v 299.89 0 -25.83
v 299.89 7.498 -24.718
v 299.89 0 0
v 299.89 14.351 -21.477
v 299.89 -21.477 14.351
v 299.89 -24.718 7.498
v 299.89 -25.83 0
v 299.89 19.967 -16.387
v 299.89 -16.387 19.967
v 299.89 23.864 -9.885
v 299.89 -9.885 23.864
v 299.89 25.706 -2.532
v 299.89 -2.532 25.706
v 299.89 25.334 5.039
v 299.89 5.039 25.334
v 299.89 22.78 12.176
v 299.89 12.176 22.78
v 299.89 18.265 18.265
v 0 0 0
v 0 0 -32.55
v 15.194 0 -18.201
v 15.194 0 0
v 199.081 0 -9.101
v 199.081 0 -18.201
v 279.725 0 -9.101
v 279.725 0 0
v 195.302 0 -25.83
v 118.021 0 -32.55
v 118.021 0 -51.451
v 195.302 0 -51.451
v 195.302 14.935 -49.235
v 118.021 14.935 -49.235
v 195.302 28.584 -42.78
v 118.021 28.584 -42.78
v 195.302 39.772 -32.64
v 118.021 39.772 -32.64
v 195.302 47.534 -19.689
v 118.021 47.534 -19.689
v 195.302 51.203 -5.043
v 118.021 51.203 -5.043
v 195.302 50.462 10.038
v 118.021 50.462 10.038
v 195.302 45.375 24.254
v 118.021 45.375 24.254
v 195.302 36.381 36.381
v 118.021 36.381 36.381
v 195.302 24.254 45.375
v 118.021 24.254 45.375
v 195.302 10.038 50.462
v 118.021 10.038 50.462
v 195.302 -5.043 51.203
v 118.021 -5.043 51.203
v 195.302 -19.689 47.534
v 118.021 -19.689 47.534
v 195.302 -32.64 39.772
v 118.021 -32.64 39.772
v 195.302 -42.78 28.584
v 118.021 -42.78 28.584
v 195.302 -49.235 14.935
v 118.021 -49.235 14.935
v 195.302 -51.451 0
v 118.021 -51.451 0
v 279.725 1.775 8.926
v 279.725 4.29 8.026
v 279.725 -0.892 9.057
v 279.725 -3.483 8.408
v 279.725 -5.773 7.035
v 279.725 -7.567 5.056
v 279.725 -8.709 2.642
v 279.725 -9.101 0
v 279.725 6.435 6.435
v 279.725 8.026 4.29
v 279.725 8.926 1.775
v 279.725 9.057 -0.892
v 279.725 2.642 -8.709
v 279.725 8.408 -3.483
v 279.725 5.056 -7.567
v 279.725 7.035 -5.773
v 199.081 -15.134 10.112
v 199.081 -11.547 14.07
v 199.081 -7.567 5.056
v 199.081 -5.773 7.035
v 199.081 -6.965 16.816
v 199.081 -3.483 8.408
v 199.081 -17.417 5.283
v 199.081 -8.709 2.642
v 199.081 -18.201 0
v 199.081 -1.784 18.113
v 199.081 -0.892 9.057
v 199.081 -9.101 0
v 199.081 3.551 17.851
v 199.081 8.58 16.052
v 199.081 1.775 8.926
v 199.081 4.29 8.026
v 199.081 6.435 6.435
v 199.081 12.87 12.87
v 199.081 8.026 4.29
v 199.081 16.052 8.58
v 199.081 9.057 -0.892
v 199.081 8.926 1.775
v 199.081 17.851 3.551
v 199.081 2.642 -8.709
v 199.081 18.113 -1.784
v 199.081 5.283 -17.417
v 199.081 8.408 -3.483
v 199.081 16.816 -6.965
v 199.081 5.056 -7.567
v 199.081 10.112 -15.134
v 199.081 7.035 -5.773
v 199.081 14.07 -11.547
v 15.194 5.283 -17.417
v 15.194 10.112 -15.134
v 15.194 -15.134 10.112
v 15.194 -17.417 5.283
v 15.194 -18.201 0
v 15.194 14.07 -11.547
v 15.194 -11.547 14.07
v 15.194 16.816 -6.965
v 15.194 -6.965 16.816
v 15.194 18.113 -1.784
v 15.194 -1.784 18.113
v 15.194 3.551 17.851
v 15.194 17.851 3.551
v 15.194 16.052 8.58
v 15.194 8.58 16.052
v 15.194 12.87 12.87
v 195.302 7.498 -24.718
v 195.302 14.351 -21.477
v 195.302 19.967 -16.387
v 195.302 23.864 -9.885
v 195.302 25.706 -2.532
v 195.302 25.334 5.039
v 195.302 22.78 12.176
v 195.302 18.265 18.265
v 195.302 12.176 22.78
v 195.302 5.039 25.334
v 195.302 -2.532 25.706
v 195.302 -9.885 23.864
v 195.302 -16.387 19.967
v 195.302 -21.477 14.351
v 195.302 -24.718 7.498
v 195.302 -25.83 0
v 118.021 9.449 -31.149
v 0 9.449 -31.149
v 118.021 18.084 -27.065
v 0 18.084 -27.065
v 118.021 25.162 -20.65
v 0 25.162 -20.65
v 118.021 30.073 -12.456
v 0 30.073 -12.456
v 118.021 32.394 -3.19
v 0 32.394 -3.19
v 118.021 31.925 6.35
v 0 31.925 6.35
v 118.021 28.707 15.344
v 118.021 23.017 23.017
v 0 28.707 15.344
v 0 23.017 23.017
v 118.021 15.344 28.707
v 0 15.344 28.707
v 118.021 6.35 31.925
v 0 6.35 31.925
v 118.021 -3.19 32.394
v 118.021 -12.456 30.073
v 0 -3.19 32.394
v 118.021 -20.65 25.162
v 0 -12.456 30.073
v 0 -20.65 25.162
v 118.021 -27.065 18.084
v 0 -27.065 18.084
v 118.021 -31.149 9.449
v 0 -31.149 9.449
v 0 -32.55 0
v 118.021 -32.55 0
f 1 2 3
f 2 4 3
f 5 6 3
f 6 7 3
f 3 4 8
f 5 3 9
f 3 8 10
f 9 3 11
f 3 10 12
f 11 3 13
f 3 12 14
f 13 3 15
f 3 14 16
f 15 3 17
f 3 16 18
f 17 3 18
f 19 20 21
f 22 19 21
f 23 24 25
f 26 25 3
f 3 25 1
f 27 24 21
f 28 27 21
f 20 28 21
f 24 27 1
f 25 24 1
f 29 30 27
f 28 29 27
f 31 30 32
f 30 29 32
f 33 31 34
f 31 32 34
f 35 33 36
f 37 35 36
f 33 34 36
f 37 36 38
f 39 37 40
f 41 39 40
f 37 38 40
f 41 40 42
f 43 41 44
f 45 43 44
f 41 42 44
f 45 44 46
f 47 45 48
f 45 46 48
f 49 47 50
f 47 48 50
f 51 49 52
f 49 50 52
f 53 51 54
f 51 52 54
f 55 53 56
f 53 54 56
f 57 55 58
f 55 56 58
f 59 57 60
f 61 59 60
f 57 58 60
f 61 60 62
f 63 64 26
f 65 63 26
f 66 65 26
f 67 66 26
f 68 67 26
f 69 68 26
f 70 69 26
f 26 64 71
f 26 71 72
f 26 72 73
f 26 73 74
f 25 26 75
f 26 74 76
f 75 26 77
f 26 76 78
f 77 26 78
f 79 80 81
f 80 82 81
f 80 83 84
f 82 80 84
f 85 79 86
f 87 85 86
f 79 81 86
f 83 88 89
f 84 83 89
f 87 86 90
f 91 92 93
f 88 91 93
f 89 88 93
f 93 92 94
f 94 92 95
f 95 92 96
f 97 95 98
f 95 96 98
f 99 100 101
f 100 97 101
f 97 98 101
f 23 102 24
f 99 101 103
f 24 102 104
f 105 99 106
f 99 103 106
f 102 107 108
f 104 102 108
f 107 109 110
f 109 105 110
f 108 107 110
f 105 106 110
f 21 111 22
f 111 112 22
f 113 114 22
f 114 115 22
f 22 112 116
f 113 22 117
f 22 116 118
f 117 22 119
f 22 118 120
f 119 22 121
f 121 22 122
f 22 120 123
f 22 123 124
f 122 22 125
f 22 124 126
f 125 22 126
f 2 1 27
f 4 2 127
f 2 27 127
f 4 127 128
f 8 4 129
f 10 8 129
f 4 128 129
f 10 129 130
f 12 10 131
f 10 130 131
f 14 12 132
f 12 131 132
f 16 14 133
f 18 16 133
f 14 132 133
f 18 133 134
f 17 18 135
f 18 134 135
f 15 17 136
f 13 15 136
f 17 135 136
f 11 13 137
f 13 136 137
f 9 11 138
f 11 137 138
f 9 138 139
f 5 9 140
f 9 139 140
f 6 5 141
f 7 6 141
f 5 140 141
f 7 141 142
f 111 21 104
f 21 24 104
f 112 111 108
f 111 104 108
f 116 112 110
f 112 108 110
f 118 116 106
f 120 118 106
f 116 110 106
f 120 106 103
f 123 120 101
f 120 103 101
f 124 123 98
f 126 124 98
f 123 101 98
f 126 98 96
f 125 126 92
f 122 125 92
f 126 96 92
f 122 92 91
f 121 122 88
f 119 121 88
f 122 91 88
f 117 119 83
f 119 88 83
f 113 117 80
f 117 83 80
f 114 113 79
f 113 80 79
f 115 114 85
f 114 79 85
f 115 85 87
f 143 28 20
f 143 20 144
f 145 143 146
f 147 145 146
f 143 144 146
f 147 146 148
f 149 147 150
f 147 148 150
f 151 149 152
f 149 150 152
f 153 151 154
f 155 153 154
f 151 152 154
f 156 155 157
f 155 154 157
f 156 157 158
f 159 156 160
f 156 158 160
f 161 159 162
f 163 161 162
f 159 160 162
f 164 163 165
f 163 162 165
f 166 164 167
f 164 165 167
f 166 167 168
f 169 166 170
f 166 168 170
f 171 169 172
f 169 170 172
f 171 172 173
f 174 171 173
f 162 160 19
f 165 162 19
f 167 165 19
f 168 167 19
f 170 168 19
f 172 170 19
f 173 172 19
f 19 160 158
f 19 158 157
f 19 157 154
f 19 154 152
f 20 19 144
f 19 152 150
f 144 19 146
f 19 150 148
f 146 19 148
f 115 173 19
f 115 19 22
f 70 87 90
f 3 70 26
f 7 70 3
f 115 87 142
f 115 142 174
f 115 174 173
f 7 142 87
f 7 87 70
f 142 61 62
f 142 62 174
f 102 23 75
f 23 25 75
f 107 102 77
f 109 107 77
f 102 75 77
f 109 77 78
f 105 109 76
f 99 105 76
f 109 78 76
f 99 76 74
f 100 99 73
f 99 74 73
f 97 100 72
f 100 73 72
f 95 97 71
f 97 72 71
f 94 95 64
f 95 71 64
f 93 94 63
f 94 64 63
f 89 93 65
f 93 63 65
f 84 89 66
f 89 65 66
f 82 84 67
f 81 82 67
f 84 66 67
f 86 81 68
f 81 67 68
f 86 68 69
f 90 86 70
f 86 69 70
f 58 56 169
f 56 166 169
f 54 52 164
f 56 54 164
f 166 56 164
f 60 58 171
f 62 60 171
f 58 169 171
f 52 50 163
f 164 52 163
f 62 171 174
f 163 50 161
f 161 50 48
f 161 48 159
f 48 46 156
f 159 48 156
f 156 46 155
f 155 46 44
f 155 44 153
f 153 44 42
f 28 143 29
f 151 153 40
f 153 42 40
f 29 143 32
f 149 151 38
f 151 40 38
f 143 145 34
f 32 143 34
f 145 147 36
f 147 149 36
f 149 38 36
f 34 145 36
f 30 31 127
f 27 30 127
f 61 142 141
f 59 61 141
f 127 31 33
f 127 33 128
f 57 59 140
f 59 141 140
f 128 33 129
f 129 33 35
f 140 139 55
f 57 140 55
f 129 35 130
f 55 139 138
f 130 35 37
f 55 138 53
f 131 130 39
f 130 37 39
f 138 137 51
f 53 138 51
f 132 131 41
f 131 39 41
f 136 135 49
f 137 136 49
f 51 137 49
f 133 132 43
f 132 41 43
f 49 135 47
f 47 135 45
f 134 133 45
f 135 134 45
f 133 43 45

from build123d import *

# Parameters (mm, degrees)
REVOLVE4_ANGLE = 270


with BuildPart() as part:
    # Sketch1 → Revolve4 (revolve)
    with BuildSketch(Plane(origin=(0, 0, 0), x_dir=(1, 0, 0), z_dir=(0, 1, 0))):
        Polygon((0, 32.550341736), (0, 0), (15.19362108, 0), (15.19362108, 18.201077386), (199.080833898, 18.201077386), (199.080833898, 9.100538693), (279.725137873, 9.100538693), (279.725137873, 0), (299.890300867, 0), (299.890300867, 25.830271184), (195.302050415, 25.830271184), (195.302050415, 51.450540163), (118.021239068, 51.450540163), (118.021239068, 32.550341736), align=None)
    revolve(axis=Axis((0, 0, 0), (1, 0, 0)), revolution_arc=REVOLVE4_ANGLE)


solid = part.part
